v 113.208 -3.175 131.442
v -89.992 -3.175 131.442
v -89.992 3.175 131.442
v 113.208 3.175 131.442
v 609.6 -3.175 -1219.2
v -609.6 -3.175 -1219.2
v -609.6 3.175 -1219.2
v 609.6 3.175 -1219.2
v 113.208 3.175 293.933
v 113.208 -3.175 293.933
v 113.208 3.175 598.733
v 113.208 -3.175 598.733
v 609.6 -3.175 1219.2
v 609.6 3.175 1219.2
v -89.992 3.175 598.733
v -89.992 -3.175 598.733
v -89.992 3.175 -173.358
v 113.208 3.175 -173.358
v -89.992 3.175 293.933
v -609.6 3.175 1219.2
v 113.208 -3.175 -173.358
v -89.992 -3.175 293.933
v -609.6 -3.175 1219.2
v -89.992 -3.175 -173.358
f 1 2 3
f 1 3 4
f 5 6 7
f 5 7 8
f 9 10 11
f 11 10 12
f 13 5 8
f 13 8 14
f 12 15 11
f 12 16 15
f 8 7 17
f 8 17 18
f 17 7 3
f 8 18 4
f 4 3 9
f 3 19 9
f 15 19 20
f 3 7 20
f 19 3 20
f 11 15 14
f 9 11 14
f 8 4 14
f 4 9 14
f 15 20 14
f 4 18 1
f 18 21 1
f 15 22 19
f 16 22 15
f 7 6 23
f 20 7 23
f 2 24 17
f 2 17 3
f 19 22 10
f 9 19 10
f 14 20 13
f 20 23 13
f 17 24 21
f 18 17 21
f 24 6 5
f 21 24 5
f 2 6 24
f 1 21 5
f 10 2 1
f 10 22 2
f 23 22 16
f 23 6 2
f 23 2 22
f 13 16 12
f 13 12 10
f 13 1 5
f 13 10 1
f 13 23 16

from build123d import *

# Parameters (mm, degrees)
F0_W     = 1219.2
F0_H     = 2438.4
F0_W_2   = 203.2
F0_H_2   = 304.8
F1_DEPTH = 3.175


with BuildPart() as f1:
    # F0 (on Front) → F1 (new body, symmetric)
    with BuildSketch(Plane.XZ):
        Rectangle(F0_W, F0_H)
        with Locations((11.608229, -20.958262)):
            Rectangle(F0_W_2, F0_H_2, mode=Mode.SUBTRACT)
        with Locations((11.608229, 446.332766)):
            Rectangle(F0_W_2, F0_H_2, mode=Mode.SUBTRACT)
    extrude(amount=F1_DEPTH, both=True)


solid = f1.part
